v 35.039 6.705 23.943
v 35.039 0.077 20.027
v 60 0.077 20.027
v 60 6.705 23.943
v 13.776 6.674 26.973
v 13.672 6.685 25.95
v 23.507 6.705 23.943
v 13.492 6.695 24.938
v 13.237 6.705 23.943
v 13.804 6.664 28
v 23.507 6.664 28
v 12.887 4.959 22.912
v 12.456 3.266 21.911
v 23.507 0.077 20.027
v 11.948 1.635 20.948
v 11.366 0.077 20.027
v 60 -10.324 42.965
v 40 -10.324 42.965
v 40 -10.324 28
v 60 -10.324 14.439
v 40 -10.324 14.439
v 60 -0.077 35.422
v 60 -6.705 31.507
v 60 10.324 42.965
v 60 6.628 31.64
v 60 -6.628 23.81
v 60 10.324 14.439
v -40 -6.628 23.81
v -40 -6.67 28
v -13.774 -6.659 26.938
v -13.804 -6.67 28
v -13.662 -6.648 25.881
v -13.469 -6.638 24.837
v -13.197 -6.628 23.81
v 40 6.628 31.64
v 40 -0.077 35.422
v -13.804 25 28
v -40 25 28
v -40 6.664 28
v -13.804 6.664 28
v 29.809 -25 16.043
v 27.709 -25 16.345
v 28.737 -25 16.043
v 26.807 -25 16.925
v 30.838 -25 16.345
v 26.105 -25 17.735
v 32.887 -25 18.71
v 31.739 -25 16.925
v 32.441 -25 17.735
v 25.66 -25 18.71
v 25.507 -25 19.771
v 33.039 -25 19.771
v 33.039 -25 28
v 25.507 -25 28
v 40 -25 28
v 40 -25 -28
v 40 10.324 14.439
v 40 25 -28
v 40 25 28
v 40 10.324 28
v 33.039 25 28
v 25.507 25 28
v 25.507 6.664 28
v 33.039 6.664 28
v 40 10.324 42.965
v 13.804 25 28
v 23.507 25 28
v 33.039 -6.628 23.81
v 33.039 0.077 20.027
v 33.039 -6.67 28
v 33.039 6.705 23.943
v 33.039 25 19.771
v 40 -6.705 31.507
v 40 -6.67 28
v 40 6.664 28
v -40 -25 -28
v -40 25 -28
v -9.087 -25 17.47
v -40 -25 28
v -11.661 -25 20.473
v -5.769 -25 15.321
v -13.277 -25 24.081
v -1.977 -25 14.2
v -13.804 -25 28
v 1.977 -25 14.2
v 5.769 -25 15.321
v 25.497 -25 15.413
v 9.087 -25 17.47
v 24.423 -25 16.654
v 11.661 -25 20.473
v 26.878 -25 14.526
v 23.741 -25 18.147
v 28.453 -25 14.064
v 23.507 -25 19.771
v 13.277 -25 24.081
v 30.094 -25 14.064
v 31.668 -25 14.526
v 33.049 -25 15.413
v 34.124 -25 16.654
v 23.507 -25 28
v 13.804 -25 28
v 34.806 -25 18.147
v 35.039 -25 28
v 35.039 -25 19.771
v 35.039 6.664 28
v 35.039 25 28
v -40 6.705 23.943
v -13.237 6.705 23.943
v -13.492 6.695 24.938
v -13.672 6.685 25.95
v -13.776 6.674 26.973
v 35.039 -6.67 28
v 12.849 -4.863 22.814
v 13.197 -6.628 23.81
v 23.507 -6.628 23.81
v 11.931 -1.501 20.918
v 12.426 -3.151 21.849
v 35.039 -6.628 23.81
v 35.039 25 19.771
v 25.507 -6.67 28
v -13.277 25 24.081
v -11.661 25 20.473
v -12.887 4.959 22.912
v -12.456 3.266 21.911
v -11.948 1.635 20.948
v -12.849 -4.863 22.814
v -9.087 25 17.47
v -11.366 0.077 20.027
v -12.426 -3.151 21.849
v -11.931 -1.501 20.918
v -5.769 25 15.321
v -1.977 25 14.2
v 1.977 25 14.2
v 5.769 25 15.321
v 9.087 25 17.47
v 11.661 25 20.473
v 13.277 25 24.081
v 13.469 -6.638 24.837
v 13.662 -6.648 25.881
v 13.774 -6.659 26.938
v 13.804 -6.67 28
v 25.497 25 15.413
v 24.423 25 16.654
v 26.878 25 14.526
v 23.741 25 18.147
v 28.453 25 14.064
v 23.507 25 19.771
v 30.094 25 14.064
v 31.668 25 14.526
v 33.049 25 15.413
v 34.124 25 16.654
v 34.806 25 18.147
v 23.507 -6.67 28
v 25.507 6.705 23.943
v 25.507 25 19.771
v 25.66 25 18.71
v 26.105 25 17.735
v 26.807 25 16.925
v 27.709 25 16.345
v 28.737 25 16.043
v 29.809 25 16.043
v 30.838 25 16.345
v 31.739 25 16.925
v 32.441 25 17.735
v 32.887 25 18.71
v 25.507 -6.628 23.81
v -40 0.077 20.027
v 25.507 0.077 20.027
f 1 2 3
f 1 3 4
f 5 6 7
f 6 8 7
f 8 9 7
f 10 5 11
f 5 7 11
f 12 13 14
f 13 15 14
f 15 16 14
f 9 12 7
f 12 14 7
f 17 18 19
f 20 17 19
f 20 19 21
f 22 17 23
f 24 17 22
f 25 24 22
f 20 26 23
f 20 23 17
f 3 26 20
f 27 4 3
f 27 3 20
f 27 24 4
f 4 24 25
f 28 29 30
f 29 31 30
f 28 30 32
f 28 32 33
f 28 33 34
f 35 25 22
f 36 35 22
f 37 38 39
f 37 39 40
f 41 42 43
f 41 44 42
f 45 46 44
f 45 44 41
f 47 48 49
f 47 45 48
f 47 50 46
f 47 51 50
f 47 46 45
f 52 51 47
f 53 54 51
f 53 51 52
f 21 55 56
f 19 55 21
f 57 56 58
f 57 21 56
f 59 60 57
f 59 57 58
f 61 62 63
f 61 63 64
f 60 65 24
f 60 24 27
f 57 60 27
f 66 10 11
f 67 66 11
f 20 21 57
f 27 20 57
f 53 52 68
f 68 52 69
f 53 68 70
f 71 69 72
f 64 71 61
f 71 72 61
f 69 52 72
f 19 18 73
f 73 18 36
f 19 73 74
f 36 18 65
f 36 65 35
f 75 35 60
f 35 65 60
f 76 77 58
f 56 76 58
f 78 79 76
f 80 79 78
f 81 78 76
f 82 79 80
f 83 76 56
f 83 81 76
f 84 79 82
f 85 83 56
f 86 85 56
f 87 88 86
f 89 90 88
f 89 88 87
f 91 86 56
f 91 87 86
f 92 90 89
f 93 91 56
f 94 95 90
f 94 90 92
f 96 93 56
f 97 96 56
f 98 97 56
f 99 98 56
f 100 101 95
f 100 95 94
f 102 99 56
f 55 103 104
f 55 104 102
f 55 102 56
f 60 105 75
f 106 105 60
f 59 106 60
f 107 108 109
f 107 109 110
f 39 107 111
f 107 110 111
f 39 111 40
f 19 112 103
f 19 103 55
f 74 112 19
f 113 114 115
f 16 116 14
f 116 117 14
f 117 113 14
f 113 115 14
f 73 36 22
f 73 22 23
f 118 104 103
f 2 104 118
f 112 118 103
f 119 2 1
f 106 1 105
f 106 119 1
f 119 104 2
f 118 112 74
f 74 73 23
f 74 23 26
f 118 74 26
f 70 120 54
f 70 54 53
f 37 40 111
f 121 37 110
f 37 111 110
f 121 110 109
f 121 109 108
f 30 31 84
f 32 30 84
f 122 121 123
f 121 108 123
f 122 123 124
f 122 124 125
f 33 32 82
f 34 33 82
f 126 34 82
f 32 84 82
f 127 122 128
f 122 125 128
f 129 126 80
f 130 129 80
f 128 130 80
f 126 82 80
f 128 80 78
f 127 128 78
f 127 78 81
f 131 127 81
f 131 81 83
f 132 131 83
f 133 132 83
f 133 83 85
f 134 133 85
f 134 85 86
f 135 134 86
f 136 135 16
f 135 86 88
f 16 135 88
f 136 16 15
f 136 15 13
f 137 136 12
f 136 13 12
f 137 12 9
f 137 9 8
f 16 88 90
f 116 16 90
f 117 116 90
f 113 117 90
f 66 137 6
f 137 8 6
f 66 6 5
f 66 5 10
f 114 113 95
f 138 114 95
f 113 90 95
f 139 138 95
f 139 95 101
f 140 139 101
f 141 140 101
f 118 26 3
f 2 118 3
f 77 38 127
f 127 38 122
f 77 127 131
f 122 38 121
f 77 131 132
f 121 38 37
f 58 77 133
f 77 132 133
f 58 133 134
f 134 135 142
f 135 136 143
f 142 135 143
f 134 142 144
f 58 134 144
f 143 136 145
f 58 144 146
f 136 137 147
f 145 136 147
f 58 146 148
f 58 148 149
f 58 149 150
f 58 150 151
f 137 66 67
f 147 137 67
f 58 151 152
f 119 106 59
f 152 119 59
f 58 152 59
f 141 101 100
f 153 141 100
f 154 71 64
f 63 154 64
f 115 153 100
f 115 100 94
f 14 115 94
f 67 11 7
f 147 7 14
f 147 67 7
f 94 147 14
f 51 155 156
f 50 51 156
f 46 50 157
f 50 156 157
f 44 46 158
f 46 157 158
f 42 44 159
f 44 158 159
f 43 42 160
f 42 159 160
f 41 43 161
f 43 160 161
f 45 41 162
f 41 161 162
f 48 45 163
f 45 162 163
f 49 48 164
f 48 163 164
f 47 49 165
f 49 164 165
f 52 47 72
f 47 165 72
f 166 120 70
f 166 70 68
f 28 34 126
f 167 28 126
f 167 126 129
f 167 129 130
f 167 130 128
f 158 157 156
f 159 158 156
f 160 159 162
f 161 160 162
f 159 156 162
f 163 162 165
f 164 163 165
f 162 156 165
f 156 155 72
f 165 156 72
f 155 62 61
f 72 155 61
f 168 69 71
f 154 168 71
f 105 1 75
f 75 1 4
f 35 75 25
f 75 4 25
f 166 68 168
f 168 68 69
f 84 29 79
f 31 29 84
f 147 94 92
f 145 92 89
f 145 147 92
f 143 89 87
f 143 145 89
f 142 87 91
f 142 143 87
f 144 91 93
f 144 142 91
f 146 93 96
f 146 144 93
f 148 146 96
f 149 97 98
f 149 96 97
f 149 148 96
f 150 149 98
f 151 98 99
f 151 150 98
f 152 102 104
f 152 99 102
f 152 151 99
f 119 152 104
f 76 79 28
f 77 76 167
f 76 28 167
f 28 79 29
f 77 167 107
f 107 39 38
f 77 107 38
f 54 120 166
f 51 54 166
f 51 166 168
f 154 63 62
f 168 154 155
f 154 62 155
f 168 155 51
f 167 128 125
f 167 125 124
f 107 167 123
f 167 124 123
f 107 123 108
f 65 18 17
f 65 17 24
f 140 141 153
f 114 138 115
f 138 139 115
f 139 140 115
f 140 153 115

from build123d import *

# Parameters (mm, degrees)
SKETCH1_W               = 80
SKETCH1_H               = 50
BOSS_EXTRUDE1_DEPTH     = 28
SKETCH4_W               = 28.526501157
SKETCH4_H               = 20.647376572
BOSS_EXTRUDE2_DEPTH     = 20
SKETCH5_R               = 13.804964926
CUT_EXTRUDE1_DEPTH      = 101
CUT_EXTRUDE_THIN1_DEPTH = 101
CUT_EXTRUDE2_DEPTH      = 186


with BuildPart() as part:
    # Sketch1 → Boss-Extrude1 (new, symmetric)
    with BuildSketch(Plane.XY):
        Rectangle(SKETCH1_W, SKETCH1_H)
    extrude(amount=BOSS_EXTRUDE1_DEPTH, both=True)

    # Sketch4 → Boss-Extrude2 (add)
    with BuildSketch(Plane(origin=(40, 0, 0), x_dir=(0, 0, -1), z_dir=(1, 0, 0))):
        with Locations((-28.702217438, 0)):
            Rectangle(SKETCH4_W, SKETCH4_H)
    extrude(amount=BOSS_EXTRUDE2_DEPTH)

    # Sketch5 → Cut-Extrude1 (cut)
    with BuildSketch(Plane(origin=(0, -25, 0), x_dir=(-1, 0, 0), z_dir=(0, -1, 0))):
        with Locations((0, -27.862468962)):
            Circle(SKETCH5_R)
    extrude(amount=-CUT_EXTRUDE1_DEPTH, mode=Mode.SUBTRACT)

    # Sketch6 → Cut-Extrude-Thin1 (cut)
    with BuildSketch(Plane(origin=(0, 25, 0), x_dir=(1, 0, 0), z_dir=(0, 1, 0))):
        with BuildLine():
            Line((23.50717257, -42.687817219), (23.50717257, -19.771016571))
            ThreePointArc((23.50717257, -19.771016571), (29.273197617, -14.004991523), (35.039222665, -19.771016571))
            Line((35.039222665, -19.771016571), (35.039222665, -42.687817219))
            ThreePointArc((35.039222665, -42.687817219), (29.273197617, -48.453842267), (23.50717257, -42.687817219))
        make_face()
        with BuildLine():
            Line((25.50717257, -42.687817219), (25.50717257, -19.771016571))
            ThreePointArc((25.50717257, -19.771016571), (29.273197617, -16.004991523), (33.039222665, -19.771016571))
            Line((33.039222665, -19.771016571), (33.039222665, -42.687817219))
            ThreePointArc((33.039222665, -42.687817219), (29.273197617, -46.453842267), (25.50717257, -42.687817219))
        make_face(mode=Mode.SUBTRACT)
    extrude(amount=-CUT_EXTRUDE_THIN1_DEPTH, mode=Mode.SUBTRACT)


with BuildPart() as cut_extrude_thin1_piece_1:
    # of the separate pieces the step leaves, piece 1, a body of its own (cut_extrude_thin1_pieces)
    add(part.part.solids().sort_by_distance((-40, 25, -28))[0])


with BuildPart() as cut_extrude_thin1_piece_2:
    # of the separate pieces the step leaves, piece 2, a body of its own (cut_extrude_thin1_pieces)
    add(part.part.solids().sort_by_distance((33.039222665, 25, 19.771016571))[0])


with BuildPart() as cut_extrude2_tool:
    # Sketch8 → Cut-Extrude2 (new body)
    with BuildSketch(Plane(origin=(60, 0, 0), x_dir=(0, 0, -1), z_dir=(1, 0, 0))):
        Polygon((-23.942834364, 6.704638127), (-31.640273085, 6.627716825), (-35.422376643, -0.076921302), (-31.507041482, -6.704638127), (-23.809602761, -6.627716825), (-20.027499203, 0.076921302), align=None)
    extrude(amount=-CUT_EXTRUDE2_DEPTH)


with BuildPart() as cut_extrude_thin1_piece_1_1:
    add(cut_extrude_thin1_piece_1.part)

    # Cut-Extrude2: cut by cut_extrude2_tool
    add(cut_extrude2_tool.part, mode=Mode.SUBTRACT)


with BuildPart() as cut_extrude_thin1_piece_2_1:
    add(cut_extrude_thin1_piece_2.part)

    # Cut-Extrude2: cut by cut_extrude2_tool
    add(cut_extrude2_tool.part, mode=Mode.SUBTRACT)


solid = Compound([cut_extrude_thin1_piece_1_1.part, cut_extrude_thin1_piece_2_1.part])
